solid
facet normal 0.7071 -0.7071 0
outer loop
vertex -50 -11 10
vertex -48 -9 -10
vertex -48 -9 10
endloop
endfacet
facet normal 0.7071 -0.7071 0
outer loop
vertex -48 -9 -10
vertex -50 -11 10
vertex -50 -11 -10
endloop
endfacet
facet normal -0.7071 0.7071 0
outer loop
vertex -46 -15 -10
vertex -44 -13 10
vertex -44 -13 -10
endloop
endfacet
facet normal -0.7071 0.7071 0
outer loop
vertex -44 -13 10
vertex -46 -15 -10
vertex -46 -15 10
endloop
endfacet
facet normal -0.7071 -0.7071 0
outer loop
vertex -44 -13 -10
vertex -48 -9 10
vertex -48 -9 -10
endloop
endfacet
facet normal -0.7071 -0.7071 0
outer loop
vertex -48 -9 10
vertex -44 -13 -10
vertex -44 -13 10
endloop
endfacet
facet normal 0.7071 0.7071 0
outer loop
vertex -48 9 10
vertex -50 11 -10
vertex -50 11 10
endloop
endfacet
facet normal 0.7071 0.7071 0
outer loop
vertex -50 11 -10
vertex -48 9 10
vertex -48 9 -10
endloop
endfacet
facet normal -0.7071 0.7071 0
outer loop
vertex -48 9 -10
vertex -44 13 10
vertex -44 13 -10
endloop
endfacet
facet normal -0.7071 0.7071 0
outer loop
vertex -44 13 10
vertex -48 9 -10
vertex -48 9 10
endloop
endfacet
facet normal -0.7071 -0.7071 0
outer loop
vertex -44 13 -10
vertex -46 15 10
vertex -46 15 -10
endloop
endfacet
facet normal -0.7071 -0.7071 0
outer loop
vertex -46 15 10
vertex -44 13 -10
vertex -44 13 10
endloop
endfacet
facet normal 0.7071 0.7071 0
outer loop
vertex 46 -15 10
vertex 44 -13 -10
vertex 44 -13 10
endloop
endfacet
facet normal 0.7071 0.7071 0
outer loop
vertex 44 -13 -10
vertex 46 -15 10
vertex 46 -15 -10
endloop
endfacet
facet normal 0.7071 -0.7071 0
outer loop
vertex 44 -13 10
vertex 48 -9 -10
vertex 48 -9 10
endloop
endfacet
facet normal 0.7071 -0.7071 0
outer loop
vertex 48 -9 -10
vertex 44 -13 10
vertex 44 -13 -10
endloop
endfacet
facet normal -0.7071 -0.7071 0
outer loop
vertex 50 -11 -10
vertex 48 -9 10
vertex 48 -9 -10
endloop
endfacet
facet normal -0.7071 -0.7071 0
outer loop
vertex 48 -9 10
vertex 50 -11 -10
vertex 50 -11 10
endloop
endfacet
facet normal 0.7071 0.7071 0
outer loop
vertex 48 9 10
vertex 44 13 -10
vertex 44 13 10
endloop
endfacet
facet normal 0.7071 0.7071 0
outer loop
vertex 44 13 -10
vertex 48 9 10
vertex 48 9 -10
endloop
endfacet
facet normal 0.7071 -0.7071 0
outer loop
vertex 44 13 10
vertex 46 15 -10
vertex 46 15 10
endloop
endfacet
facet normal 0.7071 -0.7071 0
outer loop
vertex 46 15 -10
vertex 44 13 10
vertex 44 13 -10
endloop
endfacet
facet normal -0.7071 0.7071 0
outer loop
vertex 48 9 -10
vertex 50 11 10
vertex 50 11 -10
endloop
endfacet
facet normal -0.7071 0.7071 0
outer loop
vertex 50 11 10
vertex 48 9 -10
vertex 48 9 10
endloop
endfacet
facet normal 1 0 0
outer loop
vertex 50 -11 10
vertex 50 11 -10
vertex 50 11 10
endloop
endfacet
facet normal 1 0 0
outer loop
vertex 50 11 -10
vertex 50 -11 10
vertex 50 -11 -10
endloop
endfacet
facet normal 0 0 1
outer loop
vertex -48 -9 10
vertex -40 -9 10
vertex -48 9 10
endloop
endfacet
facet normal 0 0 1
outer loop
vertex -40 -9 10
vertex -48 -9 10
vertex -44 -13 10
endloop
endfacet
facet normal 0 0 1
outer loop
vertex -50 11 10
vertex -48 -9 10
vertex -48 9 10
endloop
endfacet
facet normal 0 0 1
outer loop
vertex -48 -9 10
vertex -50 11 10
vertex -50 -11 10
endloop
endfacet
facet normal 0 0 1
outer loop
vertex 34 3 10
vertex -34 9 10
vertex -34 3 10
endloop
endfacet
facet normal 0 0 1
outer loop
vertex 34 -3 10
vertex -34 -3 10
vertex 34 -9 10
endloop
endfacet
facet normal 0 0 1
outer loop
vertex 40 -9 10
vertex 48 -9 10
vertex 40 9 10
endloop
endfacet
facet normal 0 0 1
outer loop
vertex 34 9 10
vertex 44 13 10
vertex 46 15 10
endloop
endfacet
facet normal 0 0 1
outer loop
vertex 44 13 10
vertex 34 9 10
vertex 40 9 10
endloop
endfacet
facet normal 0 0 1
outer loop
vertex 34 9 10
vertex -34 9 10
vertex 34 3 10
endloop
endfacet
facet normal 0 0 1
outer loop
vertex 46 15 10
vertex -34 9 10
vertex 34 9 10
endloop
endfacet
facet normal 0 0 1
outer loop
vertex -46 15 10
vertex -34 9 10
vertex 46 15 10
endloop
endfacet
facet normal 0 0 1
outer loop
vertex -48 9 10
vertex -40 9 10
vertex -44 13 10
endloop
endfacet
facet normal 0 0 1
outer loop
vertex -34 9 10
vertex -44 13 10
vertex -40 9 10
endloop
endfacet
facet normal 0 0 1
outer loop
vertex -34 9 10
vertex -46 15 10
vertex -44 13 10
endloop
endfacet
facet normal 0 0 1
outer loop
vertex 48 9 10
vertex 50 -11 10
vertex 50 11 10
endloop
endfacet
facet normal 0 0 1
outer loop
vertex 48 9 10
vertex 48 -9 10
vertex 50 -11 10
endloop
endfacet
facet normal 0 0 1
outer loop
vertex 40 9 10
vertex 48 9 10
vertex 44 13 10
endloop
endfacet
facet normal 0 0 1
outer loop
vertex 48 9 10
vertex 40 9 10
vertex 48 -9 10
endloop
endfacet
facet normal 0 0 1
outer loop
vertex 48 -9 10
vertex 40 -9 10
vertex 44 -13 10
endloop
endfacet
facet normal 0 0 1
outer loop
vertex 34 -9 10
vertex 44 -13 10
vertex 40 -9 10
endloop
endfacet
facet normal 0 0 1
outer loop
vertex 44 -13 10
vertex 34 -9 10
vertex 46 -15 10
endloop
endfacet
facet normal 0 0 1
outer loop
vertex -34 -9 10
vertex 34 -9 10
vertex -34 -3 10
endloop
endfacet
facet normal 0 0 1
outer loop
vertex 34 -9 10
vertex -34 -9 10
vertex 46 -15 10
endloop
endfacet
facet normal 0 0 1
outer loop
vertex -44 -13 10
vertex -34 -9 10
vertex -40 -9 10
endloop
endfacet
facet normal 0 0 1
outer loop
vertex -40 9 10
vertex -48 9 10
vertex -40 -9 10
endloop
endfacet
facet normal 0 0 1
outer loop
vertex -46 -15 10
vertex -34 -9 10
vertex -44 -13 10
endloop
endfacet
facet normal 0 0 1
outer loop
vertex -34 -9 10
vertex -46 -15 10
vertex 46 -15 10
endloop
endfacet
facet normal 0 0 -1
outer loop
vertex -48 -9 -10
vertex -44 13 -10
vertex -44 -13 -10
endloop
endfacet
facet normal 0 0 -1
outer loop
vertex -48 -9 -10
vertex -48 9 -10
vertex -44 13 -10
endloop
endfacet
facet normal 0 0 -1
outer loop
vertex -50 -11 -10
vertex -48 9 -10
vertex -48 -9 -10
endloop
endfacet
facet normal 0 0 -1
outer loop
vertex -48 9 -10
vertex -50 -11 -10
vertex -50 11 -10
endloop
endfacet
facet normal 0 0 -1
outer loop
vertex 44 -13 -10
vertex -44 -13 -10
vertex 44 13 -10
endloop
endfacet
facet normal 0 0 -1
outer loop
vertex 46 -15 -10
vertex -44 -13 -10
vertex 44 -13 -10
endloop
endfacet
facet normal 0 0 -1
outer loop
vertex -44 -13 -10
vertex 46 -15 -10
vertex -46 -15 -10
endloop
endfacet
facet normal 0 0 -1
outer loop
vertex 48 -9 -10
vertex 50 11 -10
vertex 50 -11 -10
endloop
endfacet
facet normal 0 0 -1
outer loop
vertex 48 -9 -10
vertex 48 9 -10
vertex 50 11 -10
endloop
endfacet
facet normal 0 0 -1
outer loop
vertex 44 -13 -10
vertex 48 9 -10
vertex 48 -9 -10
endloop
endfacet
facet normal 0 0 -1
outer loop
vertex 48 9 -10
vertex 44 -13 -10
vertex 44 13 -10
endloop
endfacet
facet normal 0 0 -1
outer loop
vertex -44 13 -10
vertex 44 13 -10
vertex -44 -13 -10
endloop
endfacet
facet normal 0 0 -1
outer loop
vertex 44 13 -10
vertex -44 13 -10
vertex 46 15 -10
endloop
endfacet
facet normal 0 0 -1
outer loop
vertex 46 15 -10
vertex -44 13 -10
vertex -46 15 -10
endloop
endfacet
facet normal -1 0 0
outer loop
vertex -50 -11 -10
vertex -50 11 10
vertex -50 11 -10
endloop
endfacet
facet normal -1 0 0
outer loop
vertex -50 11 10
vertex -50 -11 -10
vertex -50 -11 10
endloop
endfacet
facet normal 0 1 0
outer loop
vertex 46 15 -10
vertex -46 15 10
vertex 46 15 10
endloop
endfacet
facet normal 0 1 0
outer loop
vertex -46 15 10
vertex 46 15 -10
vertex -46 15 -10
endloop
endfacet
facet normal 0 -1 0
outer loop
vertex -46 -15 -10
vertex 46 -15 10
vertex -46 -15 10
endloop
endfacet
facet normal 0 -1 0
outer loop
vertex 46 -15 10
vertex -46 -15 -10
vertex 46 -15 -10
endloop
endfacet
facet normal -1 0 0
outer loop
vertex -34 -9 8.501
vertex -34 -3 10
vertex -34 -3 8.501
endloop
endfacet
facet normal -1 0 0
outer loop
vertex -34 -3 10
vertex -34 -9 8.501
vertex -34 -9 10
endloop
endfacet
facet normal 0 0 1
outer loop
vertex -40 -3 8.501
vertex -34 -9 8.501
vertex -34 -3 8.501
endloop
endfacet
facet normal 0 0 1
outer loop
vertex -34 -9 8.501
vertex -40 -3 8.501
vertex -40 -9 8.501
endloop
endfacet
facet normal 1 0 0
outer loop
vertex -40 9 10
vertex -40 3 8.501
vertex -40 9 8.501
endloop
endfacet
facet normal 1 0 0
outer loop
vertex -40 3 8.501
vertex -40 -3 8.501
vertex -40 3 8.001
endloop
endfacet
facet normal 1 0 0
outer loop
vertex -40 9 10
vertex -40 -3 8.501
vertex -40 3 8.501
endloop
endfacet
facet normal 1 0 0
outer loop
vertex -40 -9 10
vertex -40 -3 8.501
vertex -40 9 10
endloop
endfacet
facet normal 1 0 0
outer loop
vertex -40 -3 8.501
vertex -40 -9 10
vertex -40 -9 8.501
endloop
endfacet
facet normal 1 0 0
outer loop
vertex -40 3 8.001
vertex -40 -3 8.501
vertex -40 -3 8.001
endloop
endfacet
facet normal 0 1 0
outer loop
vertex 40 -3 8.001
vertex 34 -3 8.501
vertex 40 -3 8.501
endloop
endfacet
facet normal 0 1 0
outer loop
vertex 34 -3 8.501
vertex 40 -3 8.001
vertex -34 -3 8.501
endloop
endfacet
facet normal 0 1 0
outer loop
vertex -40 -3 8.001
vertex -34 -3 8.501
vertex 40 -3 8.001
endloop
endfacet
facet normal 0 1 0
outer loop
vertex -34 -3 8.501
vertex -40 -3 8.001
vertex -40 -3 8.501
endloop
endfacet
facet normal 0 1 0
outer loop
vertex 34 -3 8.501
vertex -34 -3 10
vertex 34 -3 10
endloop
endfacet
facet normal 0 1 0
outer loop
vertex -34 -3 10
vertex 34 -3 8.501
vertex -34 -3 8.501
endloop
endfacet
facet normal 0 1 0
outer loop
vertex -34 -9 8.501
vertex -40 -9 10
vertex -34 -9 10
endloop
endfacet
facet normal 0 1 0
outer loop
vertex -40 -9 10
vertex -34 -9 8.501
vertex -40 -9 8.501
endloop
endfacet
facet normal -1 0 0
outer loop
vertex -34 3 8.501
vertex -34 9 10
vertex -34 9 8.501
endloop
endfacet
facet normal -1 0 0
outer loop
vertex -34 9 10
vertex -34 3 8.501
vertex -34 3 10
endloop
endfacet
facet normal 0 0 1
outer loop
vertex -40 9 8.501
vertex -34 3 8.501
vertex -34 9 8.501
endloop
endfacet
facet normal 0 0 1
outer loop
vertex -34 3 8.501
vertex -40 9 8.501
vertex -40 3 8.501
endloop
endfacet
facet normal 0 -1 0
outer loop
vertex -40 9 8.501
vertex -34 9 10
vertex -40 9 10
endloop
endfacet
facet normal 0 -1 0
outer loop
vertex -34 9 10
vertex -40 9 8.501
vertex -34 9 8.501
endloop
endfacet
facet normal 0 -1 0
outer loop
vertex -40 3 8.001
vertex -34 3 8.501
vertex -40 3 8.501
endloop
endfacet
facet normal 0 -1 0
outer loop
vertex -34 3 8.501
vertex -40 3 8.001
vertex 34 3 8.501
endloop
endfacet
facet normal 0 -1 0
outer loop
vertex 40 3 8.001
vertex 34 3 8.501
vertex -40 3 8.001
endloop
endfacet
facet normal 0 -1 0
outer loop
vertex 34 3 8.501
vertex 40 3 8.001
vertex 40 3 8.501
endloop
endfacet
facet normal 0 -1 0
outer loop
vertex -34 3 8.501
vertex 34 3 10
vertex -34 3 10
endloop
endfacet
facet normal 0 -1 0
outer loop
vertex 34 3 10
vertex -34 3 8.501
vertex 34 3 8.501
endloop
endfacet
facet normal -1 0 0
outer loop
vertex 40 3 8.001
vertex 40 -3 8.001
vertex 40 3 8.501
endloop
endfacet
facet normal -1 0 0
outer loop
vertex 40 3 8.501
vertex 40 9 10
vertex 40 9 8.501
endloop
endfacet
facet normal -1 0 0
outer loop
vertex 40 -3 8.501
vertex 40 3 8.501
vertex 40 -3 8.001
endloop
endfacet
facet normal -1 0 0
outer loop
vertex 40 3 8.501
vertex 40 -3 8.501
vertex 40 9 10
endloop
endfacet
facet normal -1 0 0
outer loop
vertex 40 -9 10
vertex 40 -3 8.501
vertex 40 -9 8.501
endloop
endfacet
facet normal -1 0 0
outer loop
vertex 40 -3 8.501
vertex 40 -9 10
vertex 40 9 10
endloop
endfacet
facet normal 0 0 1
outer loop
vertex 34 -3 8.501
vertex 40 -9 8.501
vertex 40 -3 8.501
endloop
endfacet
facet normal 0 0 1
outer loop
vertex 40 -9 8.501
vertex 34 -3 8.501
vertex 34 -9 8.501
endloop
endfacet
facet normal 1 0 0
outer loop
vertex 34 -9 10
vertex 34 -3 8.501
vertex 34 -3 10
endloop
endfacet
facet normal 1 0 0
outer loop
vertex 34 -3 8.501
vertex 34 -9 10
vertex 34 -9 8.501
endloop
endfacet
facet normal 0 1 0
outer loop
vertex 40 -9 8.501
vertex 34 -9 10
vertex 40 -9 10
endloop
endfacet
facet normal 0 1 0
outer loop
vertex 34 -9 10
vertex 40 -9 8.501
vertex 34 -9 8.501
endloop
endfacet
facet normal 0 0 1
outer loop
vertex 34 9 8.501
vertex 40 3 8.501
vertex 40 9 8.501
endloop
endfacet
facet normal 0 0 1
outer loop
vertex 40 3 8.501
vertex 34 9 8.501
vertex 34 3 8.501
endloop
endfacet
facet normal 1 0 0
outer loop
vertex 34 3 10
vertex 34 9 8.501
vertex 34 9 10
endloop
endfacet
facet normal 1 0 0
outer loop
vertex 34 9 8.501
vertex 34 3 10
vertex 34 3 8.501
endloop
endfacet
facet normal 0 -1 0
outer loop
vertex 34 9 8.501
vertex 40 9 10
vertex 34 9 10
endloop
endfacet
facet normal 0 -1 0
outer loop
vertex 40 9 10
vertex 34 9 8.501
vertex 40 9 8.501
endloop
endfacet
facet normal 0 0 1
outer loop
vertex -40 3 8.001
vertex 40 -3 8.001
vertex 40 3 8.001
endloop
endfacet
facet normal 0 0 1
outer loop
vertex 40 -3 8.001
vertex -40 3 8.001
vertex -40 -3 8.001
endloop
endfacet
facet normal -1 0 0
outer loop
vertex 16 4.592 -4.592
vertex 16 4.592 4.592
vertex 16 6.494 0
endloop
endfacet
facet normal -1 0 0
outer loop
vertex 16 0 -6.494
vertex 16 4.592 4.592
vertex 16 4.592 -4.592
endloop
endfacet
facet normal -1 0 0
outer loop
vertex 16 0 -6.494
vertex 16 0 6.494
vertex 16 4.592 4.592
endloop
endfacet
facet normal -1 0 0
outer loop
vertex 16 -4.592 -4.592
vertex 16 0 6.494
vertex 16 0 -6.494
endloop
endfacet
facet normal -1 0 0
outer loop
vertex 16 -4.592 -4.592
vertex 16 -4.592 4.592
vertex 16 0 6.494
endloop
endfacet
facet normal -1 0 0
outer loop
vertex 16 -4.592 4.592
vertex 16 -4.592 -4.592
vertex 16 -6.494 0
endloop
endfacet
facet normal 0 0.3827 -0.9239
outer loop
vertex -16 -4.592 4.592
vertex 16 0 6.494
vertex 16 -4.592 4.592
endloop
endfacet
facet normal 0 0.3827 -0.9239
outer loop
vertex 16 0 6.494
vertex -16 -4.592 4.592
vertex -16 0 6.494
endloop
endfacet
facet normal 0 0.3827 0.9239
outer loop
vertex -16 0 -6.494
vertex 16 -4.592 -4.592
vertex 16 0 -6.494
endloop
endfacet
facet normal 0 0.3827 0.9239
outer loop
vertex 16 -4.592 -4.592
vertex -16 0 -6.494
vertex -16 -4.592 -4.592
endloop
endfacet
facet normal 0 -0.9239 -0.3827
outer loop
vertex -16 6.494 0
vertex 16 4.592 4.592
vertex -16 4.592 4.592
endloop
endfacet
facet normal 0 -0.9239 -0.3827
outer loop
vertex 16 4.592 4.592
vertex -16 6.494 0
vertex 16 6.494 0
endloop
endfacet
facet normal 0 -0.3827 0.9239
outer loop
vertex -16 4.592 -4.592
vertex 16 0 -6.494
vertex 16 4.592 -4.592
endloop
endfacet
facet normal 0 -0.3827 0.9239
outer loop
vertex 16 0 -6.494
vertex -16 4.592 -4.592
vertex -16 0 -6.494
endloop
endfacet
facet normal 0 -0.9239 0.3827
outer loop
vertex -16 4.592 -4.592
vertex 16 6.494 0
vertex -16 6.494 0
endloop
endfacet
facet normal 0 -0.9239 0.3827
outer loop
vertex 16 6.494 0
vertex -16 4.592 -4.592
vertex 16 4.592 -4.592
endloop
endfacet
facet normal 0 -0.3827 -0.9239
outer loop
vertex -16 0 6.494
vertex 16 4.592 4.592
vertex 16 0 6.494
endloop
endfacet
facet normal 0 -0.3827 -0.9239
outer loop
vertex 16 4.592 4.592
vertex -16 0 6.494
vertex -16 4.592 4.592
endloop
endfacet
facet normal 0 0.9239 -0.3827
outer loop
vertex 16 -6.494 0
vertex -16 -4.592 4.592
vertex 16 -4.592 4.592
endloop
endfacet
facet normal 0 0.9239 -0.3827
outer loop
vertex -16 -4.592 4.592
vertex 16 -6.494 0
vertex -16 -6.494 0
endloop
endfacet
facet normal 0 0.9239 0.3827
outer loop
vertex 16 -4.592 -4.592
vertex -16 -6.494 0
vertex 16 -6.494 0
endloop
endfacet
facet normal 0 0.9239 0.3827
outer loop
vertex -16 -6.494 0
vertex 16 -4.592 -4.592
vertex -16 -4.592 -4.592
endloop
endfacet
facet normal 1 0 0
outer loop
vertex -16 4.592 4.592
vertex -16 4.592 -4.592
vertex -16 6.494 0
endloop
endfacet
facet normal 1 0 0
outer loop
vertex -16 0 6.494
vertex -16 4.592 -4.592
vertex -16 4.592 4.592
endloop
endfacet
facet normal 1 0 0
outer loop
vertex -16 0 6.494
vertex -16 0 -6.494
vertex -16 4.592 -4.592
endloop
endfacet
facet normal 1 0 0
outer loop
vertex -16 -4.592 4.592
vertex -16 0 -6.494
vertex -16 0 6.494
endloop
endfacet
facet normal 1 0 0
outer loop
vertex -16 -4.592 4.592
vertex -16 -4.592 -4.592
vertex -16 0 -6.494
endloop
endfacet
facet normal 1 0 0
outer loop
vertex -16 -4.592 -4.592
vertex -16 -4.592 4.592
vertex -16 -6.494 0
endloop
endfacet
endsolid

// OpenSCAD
$fn=96;

L = 100;
W = 30;
H = 20;

ch = 4;

bore_flat = 12;
bore_r = bore_flat/(2*cos(180/8));

slot_len = 80;
slot_w = 6;
slot_depth = 2;
slot_y = 0;

pad_size = 6;
pad_depth = 1.5;
pad_margin_x = 10;
pad_margin_y = 6;

module chamfered_block(l, w, h, c){
    difference(){
        cube([l,w,h], center=true);
        for (sx=[-1,1], sy=[-1,1]){
            translate([sx*(l/2 - c/2), sy*(w/2 - c/2), 0])
                rotate([0,0,45])
                    cube([c*sqrt(2), c*sqrt(2), h+0.2], center=true);
        }
    }
}

module oct_bore(h, r){
    rotate([0,90,0])
        cylinder(h=h, r=r, center=true, $fn=8);
}

module top_features(){
    union(){
        translate([0, slot_y, H/2 - slot_depth/2 + 0.001])
            cube([slot_len, slot_w, slot_depth], center=true);

        for (sx=[-1,1], sy=[-1,1]){
            translate([sx*(L/2 - pad_margin_x - pad_size/2),
                       sy*(W/2 - pad_margin_y - pad_size/2),
                       H/2 - pad_depth/2 + 0.001])
                cube([pad_size, pad_size, pad_depth], center=true);
        }
    }
}

difference(){
    chamfered_block(L,W,H,ch);
    oct_bore(W+2, bore_r);
    top_features();
}
